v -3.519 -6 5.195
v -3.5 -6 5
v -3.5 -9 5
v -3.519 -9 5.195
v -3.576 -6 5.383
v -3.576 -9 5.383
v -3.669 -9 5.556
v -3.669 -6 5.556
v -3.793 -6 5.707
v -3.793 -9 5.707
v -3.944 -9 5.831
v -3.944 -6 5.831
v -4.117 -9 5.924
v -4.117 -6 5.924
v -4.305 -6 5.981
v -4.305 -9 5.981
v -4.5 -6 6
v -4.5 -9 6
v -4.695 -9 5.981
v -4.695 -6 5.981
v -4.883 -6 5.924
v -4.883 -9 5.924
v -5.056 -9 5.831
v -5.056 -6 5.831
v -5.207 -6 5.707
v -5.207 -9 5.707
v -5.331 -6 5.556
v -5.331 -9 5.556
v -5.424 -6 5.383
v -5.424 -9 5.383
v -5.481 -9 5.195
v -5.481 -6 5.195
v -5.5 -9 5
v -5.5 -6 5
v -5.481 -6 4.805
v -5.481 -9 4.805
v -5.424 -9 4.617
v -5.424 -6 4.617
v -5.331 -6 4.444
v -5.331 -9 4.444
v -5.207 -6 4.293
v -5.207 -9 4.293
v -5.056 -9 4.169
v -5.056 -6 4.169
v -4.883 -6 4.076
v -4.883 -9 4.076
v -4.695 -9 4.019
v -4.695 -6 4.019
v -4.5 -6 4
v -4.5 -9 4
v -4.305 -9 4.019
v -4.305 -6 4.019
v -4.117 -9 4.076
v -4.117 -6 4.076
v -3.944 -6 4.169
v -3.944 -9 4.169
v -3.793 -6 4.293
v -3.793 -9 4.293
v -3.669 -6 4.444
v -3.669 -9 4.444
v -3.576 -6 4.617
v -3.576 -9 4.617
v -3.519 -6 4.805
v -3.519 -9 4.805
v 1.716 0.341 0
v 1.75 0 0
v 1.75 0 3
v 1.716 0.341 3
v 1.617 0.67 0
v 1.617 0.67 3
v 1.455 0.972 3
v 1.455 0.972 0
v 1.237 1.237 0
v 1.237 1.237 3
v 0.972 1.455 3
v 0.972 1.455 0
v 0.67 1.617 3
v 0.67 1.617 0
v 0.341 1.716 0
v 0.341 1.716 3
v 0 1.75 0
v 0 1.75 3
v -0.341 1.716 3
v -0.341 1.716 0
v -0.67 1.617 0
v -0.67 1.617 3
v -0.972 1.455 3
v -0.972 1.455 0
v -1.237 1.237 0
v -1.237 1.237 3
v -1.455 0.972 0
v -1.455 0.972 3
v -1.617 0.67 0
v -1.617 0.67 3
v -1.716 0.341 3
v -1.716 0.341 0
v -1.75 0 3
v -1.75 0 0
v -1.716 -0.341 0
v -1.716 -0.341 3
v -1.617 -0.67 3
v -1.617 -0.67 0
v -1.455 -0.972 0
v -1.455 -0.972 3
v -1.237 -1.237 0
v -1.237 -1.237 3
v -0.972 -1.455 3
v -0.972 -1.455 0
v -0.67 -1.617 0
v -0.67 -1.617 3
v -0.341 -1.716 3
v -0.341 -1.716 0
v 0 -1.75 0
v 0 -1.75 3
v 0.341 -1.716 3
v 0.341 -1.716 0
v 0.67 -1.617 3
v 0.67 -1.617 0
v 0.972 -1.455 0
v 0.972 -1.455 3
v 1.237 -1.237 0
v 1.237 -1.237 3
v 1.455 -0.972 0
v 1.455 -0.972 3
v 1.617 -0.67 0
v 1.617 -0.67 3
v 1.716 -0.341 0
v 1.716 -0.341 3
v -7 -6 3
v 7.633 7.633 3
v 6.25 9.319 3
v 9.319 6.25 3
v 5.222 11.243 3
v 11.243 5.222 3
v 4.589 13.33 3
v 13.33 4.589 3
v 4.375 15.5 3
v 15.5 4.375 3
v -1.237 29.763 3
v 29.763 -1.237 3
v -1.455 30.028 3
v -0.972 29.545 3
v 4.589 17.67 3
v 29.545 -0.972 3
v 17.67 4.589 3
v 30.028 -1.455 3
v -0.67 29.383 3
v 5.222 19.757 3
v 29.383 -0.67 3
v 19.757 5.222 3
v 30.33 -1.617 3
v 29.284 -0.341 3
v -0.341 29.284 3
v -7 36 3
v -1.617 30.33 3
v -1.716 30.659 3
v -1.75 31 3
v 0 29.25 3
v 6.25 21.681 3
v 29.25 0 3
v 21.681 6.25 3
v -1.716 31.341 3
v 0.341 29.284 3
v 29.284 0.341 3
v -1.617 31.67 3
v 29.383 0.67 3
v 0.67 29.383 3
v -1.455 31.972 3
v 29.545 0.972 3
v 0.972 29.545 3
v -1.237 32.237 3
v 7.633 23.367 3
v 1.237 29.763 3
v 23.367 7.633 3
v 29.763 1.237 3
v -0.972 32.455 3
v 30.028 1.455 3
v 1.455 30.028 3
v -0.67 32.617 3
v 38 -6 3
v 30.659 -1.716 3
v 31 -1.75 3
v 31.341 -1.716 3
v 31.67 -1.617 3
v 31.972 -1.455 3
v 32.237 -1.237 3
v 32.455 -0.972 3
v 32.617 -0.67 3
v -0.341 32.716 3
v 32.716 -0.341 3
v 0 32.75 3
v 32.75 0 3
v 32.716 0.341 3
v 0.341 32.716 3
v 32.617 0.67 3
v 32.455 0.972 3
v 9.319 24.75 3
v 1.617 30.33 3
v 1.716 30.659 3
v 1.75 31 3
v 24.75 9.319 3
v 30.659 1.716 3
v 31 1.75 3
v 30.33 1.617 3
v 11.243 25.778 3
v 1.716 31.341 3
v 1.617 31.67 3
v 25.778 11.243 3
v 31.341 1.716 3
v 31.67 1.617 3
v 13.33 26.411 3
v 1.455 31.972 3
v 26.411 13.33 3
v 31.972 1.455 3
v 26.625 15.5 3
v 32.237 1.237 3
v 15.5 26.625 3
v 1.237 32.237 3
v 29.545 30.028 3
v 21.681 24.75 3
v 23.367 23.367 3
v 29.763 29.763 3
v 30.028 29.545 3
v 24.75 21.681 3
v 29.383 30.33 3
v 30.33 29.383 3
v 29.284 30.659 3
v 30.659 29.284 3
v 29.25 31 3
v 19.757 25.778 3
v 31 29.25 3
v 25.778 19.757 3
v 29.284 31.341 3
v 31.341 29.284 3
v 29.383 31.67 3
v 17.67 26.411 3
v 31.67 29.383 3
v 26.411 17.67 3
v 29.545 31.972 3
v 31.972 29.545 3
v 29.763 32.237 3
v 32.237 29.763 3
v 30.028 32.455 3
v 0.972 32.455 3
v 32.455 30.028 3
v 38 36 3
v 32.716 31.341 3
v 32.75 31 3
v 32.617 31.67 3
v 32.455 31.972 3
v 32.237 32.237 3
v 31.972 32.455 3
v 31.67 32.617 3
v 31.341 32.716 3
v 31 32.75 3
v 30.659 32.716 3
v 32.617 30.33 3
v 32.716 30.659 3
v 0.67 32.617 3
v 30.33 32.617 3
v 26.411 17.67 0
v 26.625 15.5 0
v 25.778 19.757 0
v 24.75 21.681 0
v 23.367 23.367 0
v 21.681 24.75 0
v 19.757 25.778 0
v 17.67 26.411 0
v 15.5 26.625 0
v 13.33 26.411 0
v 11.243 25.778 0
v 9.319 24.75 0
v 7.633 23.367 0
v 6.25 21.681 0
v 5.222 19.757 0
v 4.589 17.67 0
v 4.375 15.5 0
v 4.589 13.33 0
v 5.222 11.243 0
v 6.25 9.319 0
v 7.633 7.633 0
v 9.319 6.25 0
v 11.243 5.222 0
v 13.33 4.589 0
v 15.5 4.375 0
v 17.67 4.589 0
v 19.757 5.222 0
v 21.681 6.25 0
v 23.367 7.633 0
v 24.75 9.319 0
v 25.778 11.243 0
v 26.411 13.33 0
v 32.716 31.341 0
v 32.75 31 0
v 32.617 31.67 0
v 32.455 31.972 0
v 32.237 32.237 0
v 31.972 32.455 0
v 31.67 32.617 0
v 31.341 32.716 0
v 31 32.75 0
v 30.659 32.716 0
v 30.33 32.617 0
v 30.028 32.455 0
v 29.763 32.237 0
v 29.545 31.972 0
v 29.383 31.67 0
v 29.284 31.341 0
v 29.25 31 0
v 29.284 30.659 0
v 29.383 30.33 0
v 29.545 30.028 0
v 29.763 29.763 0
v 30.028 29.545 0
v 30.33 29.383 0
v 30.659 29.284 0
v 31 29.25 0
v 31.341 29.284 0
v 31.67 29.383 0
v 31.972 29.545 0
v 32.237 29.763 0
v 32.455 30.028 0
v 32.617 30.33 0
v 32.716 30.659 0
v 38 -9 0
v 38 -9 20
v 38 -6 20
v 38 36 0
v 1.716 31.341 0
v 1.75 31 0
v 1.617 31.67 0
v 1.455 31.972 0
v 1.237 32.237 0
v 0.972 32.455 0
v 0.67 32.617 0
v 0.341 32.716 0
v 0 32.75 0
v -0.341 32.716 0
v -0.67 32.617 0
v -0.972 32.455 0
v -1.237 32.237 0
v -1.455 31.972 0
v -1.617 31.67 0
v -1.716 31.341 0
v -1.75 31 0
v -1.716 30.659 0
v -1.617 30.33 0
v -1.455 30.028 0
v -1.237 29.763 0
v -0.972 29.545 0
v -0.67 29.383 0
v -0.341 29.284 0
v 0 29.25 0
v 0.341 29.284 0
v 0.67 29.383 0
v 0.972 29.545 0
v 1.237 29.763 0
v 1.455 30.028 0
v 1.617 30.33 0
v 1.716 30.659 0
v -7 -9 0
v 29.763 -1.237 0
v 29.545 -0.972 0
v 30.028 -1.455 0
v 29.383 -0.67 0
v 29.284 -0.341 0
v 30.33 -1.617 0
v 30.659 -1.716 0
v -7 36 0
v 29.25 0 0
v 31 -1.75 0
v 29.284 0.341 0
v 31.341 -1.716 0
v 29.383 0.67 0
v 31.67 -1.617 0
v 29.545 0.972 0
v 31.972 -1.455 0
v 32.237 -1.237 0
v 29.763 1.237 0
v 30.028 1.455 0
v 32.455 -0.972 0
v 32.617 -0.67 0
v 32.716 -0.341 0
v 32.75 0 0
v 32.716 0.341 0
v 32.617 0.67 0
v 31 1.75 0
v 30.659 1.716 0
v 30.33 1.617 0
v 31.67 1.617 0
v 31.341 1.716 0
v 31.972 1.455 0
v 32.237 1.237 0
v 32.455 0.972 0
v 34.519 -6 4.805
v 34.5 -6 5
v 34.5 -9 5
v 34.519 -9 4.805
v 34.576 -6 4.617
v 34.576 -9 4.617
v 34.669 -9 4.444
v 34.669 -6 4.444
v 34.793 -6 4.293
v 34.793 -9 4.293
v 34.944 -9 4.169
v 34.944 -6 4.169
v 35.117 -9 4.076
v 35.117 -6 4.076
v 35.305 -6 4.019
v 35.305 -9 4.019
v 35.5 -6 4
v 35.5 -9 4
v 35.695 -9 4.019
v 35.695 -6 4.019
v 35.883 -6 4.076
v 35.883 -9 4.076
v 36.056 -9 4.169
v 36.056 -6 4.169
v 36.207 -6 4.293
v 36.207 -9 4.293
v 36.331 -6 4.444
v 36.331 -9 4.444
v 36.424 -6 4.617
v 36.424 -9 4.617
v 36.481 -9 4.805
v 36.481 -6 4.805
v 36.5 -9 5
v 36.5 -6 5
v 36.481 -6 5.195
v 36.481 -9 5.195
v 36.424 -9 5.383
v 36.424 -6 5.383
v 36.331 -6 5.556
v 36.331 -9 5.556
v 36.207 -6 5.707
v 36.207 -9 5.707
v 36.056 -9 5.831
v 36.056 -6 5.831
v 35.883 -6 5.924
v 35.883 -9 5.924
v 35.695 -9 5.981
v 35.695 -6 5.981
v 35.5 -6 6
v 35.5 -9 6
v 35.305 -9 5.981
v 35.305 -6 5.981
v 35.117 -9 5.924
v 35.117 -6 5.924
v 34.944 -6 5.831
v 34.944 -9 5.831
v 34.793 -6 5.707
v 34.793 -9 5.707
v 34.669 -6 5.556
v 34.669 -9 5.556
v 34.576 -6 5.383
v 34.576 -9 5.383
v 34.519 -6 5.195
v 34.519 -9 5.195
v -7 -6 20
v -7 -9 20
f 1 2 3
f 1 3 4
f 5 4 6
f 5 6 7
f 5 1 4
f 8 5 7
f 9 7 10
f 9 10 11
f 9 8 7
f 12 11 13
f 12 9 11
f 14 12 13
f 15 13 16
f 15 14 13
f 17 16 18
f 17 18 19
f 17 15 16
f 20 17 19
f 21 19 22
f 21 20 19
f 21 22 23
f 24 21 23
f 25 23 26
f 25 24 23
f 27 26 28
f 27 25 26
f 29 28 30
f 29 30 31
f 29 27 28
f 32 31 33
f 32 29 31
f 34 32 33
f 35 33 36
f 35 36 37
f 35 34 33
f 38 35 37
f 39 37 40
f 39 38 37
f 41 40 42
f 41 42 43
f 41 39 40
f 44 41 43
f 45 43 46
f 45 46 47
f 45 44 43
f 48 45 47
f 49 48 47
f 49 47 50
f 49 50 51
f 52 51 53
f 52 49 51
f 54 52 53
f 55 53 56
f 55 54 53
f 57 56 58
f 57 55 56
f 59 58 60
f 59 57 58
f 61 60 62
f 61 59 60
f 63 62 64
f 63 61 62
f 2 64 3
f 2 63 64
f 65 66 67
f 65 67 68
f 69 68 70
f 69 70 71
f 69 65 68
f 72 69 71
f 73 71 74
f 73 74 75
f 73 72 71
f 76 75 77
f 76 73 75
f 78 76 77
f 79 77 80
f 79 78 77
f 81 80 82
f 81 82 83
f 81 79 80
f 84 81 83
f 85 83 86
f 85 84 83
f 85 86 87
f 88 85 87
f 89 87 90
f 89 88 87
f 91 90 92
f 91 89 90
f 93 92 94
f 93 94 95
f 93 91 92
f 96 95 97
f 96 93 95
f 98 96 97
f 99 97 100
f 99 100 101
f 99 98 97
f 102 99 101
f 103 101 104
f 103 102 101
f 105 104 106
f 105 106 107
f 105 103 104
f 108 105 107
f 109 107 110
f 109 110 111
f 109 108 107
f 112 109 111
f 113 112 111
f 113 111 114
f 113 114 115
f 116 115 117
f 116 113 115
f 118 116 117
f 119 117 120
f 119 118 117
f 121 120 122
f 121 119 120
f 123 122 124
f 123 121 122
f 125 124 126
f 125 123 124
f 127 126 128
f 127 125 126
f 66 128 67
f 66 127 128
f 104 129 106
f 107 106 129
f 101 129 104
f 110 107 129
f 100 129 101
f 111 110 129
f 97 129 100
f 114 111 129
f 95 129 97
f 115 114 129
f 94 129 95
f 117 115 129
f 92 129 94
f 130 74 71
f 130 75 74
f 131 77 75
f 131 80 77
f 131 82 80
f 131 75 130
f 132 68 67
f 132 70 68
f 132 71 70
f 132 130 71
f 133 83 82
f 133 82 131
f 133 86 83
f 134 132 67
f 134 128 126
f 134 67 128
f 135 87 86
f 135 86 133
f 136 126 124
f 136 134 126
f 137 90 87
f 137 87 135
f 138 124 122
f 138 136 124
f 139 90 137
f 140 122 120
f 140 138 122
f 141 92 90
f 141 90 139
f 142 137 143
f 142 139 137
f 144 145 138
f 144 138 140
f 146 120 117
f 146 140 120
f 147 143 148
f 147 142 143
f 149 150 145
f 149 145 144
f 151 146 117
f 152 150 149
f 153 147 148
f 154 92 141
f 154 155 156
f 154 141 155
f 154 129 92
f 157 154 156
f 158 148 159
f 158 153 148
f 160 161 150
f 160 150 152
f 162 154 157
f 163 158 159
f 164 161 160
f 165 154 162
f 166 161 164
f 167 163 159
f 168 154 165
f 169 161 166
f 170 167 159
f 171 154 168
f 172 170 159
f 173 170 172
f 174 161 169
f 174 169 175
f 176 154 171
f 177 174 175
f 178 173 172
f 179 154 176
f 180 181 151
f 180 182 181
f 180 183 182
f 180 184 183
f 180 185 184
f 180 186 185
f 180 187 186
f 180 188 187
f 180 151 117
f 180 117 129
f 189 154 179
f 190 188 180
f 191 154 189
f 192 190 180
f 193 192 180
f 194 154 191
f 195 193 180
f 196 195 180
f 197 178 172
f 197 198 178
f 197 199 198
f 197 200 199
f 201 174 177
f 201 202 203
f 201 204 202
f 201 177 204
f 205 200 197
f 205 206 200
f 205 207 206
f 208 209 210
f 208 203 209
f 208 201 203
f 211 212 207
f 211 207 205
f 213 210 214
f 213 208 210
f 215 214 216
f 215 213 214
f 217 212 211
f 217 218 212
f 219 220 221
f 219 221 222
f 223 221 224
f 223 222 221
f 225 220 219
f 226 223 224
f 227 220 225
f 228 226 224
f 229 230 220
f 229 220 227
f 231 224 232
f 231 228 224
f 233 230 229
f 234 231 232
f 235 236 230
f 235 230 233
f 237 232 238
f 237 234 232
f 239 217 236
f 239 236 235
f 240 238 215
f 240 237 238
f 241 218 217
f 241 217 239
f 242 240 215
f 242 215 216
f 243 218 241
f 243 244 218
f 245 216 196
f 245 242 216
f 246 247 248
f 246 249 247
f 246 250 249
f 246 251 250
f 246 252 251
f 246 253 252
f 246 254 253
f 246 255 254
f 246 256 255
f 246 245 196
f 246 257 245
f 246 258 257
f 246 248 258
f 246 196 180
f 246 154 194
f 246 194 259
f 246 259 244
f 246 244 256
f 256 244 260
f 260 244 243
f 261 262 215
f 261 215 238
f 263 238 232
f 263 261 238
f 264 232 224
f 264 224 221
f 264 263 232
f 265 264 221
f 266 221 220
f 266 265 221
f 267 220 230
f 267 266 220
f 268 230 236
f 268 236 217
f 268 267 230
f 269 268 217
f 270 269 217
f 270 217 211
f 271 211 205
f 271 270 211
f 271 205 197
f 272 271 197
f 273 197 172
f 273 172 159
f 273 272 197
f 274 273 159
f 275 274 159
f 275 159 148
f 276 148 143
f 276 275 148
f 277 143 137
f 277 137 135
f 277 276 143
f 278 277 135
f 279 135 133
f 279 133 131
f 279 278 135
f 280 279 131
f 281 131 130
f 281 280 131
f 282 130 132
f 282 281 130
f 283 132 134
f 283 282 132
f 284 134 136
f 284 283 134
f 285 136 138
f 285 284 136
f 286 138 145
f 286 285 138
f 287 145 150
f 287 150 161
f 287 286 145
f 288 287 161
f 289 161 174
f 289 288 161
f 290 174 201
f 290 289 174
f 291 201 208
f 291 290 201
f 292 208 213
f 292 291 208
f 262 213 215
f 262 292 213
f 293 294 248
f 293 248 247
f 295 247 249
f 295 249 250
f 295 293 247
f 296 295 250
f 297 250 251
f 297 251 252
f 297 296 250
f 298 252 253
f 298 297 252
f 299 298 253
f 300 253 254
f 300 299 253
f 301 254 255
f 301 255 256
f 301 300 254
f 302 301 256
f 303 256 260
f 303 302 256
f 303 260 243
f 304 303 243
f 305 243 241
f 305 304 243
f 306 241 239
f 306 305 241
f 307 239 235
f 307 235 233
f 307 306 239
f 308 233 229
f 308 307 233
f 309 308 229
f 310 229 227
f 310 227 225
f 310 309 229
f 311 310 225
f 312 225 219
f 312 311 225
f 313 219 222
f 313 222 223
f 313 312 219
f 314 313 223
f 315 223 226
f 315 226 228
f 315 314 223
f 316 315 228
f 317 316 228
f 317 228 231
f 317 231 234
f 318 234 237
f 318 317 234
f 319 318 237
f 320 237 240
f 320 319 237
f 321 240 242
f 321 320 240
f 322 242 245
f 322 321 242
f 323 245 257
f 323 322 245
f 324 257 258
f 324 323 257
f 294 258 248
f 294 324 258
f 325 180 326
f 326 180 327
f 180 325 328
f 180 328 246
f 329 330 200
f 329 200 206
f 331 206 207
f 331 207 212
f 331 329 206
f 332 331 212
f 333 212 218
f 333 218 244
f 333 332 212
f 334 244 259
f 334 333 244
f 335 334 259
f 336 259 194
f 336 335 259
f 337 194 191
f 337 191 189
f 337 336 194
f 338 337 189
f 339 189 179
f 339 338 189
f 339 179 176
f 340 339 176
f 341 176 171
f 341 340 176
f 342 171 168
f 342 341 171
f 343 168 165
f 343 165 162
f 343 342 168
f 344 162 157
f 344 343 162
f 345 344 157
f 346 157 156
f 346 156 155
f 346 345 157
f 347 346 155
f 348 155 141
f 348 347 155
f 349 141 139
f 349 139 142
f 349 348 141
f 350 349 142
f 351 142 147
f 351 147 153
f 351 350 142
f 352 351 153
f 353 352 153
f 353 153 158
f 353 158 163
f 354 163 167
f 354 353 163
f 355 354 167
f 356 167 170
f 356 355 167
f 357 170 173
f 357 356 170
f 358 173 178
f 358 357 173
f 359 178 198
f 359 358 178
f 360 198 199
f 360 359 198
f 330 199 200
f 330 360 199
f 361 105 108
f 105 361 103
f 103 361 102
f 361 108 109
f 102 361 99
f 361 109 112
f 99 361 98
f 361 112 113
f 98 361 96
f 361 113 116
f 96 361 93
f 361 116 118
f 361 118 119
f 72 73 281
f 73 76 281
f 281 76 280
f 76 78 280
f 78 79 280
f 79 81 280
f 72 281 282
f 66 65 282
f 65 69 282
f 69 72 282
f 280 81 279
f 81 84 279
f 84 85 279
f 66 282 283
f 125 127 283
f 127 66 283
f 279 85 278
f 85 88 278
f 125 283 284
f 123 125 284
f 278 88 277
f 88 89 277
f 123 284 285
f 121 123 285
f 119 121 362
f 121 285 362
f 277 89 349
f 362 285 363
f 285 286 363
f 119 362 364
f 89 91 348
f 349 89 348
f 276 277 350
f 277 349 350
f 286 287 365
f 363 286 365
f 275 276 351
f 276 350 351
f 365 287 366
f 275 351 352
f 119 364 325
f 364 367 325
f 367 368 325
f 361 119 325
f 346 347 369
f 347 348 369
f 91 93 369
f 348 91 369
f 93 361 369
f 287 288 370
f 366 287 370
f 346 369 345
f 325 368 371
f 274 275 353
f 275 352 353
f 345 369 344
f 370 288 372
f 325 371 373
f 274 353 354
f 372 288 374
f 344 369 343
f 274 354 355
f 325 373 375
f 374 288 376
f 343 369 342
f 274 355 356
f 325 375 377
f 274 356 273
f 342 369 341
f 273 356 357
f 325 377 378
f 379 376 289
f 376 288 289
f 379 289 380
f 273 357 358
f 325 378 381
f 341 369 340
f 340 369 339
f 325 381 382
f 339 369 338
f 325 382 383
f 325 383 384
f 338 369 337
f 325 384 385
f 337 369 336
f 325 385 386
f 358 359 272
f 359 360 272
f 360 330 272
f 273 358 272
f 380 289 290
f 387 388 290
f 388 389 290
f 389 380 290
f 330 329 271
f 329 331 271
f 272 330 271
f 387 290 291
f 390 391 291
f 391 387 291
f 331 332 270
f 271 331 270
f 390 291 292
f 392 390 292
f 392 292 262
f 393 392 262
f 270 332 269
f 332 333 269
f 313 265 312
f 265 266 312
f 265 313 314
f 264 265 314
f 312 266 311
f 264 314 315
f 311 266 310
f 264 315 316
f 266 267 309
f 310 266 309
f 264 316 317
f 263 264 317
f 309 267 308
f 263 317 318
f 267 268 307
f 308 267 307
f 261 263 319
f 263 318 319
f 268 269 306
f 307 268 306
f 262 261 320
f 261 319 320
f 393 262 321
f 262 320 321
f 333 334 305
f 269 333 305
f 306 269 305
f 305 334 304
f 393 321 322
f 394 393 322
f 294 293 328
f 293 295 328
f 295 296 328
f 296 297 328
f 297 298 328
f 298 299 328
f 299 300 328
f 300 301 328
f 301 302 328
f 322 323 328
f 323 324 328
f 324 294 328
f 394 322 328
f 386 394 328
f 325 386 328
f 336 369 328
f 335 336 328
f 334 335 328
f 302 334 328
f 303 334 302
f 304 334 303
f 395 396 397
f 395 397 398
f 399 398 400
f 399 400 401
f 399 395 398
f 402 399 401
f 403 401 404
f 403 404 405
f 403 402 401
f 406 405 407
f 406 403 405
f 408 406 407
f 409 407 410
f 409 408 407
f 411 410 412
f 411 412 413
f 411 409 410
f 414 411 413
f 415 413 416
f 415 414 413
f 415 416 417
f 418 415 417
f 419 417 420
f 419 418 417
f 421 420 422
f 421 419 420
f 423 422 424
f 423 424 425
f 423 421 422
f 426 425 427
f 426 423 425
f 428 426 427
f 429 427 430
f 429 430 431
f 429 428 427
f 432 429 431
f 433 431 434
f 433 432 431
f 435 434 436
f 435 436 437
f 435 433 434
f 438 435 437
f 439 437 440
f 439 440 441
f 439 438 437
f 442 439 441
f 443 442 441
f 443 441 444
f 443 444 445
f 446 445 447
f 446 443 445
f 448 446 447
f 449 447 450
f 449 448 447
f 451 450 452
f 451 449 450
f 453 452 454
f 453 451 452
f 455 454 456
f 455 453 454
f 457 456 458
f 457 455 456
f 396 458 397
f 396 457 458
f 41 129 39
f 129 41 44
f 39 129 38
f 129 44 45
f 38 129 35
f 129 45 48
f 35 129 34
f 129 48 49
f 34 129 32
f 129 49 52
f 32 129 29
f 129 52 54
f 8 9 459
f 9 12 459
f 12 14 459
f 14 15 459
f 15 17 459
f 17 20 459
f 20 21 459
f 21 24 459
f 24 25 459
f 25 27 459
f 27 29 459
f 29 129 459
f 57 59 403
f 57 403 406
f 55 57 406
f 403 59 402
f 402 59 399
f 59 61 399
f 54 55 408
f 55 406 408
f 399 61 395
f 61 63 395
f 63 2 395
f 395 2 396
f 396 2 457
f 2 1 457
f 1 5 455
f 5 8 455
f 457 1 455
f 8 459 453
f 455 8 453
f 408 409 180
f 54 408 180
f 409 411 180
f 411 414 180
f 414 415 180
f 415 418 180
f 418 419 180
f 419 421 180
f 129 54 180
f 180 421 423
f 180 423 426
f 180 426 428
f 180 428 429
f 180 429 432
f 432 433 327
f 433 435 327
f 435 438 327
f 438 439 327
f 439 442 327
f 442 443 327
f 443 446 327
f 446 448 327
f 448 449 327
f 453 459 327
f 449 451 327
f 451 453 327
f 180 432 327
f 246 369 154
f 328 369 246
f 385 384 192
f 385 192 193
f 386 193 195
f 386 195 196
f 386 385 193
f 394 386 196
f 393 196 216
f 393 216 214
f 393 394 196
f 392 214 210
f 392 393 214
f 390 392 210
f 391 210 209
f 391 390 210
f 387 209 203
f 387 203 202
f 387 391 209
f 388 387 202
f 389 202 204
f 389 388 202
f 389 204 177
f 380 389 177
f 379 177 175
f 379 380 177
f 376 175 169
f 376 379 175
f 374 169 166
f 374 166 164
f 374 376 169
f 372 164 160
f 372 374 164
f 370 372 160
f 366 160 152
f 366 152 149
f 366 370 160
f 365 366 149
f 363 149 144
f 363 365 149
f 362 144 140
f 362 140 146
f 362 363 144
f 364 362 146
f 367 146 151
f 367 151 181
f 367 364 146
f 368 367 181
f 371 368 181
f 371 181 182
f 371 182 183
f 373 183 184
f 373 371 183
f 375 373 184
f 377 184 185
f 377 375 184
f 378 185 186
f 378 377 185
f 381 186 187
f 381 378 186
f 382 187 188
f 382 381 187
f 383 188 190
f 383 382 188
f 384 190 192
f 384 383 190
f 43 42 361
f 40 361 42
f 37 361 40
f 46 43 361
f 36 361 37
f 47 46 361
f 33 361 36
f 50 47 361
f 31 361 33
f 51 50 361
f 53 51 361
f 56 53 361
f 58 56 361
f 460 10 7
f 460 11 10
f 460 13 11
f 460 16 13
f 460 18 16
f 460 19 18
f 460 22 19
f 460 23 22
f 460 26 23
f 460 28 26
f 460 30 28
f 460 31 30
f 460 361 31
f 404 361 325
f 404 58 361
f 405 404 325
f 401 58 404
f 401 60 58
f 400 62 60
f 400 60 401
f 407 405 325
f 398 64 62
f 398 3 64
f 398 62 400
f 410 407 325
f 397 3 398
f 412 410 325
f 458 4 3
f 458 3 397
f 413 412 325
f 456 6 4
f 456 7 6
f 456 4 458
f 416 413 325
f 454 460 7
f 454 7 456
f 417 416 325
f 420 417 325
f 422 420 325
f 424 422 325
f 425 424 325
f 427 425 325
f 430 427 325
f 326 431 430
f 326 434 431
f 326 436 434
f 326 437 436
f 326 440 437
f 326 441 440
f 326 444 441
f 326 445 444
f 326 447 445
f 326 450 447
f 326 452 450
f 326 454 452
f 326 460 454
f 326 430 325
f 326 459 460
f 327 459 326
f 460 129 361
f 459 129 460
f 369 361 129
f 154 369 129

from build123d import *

# Parameters (mm, degrees)
ESQUISSE1_W        = 45
ESQUISSE1_H        = 42
ESQUISSE1_R        = 1.75
ESQUISSE1_R_2      = 11.125
BOSS_EXTRU_1_DEPTH = 3
ESQUISSE3_W        = 45
ESQUISSE3_H        = 20
ESQUISSE3_R        = 1
BOSS_EXTRU_2_DEPTH = 3


with BuildPart() as part:
    # Esquisse1 → Boss.-Extru.1 (new body)
    with BuildSketch(Plane.XY):
        with Locations((15.5, 15)):
            Rectangle(ESQUISSE1_W, ESQUISSE1_H)
        with Locations((0, 31)):
            Circle(ESQUISSE1_R, mode=Mode.SUBTRACT)
        with Locations((31, 31)):
            Circle(ESQUISSE1_R, mode=Mode.SUBTRACT)
        with Locations((31, 0)):
            Circle(ESQUISSE1_R, mode=Mode.SUBTRACT)
        Circle(ESQUISSE1_R, mode=Mode.SUBTRACT)
        with Locations((15.5, 15.5)):
            Circle(ESQUISSE1_R_2, mode=Mode.SUBTRACT)
    extrude(amount=BOSS_EXTRU_1_DEPTH)

    # Esquisse3 → Boss.-Extru.2 (add)
    with BuildSketch(Plane.XZ.offset(6)):
        with Locations((15.5, 10)):
            Rectangle(ESQUISSE3_W, ESQUISSE3_H)
        with Locations((-4.5, 5)):
            Circle(ESQUISSE3_R, mode=Mode.SUBTRACT)
        with Locations(Location((35.5, 5, 0), (0, 0, 180))):
            Circle(ESQUISSE3_R, mode=Mode.SUBTRACT)
    extrude(amount=BOSS_EXTRU_2_DEPTH)


solid = part.part
